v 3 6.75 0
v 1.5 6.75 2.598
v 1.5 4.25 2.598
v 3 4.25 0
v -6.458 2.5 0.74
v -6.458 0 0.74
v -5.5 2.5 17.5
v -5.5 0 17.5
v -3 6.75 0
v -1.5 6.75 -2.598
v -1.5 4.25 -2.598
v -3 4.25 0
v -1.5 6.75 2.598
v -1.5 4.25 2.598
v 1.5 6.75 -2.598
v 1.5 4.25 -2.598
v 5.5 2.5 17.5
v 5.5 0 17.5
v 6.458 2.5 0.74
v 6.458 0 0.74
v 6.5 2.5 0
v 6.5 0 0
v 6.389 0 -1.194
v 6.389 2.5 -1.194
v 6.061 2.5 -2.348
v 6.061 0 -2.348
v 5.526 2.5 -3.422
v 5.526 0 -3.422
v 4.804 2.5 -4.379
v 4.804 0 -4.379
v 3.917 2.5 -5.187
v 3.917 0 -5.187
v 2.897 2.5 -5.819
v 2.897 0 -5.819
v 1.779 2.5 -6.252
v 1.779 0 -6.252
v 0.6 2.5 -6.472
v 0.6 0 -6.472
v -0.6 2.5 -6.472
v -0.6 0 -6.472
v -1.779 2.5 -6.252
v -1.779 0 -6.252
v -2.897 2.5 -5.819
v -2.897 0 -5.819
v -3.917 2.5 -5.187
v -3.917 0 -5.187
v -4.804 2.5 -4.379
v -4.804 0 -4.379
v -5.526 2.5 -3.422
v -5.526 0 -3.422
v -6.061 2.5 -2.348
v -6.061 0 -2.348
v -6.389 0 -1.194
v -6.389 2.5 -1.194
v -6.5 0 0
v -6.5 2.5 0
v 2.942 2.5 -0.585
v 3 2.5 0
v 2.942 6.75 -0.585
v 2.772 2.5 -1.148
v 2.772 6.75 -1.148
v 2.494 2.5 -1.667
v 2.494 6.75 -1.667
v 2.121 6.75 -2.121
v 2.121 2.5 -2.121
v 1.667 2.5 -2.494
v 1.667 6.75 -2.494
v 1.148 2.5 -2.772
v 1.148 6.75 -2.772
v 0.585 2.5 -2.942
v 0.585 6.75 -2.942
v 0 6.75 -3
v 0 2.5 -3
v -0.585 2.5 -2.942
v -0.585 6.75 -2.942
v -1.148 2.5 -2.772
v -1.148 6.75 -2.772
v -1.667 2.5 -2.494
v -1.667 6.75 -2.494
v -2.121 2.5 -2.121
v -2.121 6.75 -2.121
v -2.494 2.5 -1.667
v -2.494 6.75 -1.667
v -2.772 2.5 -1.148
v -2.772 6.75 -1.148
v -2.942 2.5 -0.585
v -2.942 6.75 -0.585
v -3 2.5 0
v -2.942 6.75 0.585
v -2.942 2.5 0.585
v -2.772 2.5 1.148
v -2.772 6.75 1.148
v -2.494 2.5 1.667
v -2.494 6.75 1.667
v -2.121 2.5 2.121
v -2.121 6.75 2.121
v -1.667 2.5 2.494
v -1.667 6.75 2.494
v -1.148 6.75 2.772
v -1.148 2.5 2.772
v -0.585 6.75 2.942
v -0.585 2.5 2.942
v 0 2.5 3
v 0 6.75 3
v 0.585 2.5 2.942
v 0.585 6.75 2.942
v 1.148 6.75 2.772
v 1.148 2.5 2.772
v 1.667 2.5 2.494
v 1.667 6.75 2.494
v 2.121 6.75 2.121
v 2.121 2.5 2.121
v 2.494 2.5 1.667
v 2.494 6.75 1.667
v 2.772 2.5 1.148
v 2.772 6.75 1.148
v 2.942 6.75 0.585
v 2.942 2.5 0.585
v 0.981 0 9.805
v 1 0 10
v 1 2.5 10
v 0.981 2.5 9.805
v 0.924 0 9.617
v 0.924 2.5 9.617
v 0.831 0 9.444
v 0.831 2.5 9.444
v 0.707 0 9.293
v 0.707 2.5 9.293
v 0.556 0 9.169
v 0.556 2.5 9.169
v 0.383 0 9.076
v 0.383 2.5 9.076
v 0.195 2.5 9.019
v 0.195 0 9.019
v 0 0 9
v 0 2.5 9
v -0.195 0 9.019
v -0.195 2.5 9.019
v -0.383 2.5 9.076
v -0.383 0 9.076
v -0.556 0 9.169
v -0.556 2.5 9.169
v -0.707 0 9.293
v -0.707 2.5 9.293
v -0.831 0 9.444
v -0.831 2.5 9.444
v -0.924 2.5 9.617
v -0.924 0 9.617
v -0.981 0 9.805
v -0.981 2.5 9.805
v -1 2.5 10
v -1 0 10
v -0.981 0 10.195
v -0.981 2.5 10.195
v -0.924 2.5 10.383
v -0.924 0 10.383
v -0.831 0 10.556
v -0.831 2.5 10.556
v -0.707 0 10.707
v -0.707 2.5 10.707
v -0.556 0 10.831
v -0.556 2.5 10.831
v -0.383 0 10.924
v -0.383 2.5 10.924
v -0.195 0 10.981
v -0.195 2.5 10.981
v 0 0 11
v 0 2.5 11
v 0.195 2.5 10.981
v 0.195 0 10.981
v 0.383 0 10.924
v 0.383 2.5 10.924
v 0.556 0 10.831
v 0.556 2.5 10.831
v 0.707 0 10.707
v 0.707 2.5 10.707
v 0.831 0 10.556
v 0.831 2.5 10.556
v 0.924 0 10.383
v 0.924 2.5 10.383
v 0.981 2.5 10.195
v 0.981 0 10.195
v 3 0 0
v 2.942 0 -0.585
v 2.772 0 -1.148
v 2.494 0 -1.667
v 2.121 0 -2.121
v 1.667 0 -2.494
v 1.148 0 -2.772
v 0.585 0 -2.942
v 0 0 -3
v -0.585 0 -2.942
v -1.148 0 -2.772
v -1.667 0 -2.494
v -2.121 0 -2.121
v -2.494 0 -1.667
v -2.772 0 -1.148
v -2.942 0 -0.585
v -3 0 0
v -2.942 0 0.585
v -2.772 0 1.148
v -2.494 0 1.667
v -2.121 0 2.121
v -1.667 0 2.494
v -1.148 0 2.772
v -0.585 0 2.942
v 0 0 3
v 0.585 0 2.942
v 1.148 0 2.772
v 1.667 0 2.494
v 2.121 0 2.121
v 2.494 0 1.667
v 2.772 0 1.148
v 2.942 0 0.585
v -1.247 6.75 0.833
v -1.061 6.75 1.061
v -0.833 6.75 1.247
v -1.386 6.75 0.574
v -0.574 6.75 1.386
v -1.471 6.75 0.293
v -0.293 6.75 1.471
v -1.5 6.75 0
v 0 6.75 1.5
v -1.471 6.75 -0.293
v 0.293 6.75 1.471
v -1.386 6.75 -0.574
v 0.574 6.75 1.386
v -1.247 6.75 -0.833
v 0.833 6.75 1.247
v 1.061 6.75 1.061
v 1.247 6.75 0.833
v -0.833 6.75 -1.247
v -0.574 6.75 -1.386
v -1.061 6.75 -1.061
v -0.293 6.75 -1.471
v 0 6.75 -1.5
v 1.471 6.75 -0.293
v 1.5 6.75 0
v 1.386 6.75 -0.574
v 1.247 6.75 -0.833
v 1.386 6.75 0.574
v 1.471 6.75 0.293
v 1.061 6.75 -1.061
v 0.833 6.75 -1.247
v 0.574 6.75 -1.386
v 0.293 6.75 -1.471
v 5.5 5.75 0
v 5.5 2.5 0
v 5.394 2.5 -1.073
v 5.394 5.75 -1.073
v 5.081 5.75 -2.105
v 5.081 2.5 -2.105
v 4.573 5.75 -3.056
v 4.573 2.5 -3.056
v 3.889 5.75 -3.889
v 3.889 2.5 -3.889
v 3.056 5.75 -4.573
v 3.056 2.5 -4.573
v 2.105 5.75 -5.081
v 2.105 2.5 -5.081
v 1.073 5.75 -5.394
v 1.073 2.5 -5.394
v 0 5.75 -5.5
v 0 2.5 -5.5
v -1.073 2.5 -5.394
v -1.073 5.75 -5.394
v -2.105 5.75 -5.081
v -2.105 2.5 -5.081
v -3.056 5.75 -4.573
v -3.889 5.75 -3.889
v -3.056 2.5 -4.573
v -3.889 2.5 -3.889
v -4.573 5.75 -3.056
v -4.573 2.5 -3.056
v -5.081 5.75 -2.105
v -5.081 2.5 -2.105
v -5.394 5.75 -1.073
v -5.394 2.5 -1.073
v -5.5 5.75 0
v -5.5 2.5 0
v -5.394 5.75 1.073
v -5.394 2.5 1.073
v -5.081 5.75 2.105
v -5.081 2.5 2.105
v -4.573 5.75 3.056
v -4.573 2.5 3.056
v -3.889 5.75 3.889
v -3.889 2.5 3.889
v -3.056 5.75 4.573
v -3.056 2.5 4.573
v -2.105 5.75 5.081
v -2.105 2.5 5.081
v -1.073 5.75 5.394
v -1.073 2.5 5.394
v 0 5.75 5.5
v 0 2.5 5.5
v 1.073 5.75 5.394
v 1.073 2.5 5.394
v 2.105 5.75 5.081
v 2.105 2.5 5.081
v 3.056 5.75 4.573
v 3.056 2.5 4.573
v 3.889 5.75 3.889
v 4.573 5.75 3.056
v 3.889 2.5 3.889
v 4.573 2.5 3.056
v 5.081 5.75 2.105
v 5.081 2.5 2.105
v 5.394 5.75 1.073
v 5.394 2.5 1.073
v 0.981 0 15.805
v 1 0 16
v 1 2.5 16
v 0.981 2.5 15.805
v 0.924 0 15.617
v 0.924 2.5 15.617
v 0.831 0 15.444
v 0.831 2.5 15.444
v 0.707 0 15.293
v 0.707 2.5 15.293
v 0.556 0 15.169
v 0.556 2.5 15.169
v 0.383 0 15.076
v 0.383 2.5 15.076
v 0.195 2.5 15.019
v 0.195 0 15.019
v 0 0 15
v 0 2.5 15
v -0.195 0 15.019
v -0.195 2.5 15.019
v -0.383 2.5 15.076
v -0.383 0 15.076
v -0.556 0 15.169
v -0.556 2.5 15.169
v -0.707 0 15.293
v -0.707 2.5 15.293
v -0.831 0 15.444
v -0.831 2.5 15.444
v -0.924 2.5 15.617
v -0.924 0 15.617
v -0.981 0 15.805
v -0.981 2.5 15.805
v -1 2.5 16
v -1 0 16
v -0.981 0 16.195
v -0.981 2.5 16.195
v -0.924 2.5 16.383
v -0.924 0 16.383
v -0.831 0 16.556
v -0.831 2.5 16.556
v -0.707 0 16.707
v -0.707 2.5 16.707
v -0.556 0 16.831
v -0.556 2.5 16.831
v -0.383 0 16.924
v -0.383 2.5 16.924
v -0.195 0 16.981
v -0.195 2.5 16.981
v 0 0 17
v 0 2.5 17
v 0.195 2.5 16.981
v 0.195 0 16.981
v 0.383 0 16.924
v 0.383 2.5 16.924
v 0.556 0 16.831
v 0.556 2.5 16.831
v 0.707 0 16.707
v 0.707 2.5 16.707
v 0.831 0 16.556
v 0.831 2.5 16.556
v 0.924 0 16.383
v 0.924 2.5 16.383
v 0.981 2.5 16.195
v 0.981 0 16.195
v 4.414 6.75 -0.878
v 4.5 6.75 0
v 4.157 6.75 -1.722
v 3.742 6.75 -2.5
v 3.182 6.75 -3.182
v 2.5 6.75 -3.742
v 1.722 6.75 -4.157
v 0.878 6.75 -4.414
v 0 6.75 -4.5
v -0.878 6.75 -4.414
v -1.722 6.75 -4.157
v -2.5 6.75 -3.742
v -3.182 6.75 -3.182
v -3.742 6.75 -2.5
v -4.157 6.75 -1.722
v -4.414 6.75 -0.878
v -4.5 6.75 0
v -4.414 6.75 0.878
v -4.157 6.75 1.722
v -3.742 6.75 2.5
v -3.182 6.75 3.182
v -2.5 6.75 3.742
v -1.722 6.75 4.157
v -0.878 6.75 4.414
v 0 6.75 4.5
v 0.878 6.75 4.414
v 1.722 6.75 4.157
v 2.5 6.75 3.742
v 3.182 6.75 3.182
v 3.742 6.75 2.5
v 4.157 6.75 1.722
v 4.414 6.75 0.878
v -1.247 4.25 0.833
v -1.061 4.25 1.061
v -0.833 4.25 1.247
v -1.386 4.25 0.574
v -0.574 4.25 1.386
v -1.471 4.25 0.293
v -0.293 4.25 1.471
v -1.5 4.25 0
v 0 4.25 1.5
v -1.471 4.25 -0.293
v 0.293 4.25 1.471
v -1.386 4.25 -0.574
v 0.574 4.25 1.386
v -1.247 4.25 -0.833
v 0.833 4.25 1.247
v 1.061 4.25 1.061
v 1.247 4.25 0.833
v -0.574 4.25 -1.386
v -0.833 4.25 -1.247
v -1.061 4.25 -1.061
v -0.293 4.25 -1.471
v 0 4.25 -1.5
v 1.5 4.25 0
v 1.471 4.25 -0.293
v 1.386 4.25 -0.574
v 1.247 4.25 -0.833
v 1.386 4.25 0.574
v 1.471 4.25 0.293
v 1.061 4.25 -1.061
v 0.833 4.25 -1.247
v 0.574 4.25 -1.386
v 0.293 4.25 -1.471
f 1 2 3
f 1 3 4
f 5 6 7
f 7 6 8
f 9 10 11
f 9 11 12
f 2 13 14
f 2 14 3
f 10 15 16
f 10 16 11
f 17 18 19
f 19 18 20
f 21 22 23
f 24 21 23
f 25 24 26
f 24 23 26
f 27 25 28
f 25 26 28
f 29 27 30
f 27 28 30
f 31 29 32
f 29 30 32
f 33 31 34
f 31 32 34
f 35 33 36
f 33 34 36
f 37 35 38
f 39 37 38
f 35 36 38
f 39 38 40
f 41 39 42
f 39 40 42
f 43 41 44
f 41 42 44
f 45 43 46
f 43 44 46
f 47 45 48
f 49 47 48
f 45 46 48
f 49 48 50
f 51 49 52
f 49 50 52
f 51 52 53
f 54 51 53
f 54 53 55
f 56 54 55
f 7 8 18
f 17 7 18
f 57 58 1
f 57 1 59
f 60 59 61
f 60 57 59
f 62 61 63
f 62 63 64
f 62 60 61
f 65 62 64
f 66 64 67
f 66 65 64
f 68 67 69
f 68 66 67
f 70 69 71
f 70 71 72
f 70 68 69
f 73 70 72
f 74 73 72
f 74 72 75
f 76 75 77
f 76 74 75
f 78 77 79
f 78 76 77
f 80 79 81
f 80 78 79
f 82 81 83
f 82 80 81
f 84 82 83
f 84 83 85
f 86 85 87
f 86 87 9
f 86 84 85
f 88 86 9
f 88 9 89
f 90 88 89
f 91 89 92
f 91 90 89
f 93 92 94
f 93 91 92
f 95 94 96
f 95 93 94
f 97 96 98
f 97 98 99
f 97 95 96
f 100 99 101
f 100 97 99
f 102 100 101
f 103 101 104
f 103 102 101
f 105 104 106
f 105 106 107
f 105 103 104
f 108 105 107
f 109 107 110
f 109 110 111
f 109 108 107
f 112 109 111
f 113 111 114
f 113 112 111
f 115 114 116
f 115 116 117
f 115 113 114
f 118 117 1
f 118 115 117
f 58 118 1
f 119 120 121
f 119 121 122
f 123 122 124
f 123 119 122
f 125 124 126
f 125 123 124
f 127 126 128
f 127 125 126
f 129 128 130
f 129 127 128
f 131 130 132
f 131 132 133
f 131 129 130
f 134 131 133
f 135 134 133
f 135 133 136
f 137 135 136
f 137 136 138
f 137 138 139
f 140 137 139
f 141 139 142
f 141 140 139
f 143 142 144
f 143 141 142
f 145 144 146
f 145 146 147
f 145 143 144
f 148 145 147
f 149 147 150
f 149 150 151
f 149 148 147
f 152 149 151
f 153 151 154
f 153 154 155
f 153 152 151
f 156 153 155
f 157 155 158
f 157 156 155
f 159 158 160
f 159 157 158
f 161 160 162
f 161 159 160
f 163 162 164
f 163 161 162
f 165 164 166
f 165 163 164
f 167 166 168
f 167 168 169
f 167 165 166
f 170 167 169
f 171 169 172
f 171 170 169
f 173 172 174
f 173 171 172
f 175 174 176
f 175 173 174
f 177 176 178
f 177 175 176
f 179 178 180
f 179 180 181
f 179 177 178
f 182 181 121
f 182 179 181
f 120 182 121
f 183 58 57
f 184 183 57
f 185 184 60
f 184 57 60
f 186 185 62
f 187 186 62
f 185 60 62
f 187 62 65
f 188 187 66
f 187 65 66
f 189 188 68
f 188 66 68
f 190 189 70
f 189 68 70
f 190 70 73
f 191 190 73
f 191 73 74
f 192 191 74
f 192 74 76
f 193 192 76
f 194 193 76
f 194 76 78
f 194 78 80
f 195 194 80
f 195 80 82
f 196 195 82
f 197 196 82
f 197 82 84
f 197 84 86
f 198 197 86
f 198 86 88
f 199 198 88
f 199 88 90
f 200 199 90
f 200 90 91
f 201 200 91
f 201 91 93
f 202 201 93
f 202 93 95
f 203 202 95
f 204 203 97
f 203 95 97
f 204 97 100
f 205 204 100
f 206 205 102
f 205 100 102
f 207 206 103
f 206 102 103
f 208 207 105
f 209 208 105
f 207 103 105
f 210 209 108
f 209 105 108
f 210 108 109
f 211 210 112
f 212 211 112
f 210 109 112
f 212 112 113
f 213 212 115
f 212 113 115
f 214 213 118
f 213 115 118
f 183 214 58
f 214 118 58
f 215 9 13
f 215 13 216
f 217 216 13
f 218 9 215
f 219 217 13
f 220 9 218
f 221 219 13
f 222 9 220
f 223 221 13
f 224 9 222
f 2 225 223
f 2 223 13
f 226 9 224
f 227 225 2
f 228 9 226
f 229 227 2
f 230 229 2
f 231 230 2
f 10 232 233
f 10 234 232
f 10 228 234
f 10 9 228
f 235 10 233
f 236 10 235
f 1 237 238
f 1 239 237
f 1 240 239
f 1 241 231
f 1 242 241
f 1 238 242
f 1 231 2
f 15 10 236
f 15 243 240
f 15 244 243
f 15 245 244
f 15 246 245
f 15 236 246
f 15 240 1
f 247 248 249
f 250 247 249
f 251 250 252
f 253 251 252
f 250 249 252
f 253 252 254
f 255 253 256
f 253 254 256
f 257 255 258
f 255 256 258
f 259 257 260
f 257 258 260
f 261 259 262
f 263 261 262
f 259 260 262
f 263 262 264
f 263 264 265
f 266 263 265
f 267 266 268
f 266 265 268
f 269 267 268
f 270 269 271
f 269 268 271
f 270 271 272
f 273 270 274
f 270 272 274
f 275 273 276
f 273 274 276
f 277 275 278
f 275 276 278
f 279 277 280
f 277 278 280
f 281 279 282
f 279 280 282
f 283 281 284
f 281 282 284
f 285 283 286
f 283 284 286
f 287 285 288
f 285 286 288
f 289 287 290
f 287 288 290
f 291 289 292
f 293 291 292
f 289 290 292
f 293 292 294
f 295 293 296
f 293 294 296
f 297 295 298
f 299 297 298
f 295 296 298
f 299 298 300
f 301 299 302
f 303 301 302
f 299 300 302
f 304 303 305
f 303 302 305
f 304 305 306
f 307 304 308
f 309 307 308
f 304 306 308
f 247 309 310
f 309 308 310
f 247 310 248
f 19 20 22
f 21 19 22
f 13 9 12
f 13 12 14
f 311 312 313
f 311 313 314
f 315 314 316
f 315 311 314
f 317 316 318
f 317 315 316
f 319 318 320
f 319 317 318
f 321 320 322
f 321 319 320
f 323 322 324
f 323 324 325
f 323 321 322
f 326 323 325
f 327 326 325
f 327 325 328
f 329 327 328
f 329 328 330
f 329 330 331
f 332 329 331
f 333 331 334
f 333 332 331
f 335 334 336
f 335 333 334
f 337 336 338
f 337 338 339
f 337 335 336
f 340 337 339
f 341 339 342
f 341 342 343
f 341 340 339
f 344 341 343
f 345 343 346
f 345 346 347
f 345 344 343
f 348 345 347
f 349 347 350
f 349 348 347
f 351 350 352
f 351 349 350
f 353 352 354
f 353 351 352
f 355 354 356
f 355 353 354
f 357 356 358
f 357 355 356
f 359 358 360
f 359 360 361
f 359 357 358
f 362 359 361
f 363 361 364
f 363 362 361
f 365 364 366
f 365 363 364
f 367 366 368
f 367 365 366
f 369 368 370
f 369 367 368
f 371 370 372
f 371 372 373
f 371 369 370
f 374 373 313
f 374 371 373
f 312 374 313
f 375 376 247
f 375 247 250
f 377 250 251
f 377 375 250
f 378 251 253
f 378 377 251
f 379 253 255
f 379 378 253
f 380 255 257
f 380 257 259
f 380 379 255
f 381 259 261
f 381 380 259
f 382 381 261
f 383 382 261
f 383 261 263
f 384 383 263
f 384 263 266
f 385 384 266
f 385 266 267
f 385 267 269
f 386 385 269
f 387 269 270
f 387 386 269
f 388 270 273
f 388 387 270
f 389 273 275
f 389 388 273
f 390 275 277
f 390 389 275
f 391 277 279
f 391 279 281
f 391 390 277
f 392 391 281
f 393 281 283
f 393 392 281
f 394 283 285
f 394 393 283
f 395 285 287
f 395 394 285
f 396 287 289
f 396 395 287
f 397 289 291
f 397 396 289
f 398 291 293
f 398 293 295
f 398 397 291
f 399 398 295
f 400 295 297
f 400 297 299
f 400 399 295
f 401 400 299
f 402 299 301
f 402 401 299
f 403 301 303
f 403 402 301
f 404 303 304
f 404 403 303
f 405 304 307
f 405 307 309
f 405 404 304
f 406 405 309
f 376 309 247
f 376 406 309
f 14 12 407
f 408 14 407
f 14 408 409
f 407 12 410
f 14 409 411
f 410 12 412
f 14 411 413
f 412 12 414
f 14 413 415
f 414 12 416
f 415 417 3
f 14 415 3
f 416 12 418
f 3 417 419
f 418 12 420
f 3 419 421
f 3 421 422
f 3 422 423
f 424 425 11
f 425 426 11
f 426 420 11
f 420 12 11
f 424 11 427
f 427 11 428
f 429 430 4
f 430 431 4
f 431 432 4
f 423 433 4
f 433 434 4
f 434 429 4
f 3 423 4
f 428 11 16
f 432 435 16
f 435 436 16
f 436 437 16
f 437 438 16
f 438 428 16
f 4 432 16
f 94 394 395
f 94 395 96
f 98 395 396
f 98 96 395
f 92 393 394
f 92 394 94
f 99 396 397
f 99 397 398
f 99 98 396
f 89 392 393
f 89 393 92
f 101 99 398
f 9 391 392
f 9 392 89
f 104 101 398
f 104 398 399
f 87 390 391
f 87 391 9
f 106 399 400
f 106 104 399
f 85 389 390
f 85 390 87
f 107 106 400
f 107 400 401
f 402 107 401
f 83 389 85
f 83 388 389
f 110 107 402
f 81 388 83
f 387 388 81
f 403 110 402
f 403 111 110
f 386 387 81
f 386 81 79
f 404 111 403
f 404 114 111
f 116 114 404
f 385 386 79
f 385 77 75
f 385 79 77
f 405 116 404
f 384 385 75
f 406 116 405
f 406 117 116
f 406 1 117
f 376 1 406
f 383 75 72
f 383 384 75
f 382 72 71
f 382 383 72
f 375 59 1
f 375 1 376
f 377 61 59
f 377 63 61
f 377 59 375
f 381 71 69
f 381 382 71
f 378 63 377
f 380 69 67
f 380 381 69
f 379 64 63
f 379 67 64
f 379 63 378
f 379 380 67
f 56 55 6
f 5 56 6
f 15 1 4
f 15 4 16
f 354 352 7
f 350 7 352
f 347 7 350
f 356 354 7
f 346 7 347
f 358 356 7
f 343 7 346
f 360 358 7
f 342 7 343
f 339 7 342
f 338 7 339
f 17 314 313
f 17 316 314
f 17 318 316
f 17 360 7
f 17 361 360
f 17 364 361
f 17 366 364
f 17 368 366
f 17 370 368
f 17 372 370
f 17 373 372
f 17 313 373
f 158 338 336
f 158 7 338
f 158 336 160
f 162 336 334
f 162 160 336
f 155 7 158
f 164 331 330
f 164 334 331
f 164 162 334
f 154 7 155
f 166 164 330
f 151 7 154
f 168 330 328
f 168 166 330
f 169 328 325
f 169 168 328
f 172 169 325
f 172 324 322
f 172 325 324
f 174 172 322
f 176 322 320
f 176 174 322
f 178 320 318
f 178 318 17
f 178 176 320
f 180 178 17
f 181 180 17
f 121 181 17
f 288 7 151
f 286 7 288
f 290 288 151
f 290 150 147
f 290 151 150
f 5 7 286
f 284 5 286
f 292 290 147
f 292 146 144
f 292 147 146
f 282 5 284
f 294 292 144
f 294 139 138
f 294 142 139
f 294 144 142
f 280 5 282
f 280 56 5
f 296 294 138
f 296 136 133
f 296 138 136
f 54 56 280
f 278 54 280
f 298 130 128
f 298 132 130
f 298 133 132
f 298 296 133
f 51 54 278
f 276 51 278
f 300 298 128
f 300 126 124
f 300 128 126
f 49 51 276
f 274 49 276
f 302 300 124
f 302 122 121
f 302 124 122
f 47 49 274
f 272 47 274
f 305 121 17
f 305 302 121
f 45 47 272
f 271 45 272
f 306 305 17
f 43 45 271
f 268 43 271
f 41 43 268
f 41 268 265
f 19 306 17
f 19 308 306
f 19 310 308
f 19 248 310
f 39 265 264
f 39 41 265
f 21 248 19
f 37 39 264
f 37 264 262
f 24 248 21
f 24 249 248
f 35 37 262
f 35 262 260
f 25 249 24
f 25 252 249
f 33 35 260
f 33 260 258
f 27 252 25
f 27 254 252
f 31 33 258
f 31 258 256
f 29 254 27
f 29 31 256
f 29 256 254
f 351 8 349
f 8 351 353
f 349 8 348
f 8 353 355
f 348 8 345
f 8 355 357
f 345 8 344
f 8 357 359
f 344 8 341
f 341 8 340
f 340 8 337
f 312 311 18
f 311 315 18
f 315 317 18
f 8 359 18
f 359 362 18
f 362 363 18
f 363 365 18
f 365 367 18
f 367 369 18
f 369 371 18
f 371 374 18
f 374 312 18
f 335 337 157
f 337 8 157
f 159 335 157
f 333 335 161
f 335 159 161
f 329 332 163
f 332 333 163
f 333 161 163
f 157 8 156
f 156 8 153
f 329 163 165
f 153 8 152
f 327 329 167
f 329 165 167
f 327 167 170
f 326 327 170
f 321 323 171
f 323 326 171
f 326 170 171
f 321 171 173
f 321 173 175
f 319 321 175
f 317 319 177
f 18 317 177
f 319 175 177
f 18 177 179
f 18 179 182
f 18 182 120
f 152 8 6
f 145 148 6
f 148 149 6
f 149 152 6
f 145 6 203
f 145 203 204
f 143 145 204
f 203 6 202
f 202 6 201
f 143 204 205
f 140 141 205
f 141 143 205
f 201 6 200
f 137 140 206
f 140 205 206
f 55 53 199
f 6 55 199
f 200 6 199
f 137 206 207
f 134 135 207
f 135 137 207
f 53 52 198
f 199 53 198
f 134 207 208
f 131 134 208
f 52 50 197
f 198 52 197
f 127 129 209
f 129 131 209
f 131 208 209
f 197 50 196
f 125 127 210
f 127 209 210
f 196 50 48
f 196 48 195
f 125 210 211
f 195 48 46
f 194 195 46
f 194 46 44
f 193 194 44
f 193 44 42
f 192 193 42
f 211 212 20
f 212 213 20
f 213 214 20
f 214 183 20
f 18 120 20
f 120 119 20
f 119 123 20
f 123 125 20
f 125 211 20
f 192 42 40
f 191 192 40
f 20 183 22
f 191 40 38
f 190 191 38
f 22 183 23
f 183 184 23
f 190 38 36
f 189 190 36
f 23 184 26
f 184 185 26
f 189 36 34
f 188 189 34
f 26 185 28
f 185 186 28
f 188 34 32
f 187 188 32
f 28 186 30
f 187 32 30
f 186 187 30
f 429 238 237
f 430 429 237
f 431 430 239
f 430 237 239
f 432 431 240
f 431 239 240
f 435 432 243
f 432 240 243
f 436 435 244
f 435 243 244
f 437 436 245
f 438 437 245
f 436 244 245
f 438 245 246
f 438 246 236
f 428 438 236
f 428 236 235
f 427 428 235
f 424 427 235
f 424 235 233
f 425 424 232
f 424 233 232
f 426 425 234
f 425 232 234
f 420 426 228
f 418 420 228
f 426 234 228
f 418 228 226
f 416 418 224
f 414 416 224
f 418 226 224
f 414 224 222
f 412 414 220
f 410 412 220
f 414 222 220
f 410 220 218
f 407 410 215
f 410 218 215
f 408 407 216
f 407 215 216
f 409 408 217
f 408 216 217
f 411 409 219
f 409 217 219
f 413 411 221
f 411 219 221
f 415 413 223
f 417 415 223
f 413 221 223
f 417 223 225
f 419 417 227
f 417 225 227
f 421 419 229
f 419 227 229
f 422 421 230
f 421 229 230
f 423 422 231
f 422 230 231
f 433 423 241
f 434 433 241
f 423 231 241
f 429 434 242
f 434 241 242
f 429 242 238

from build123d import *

# Parameters (mm, degrees)
SKETCH1_R           = 1
BOSS_EXTRUDE1_DEPTH = 2.5
SKETCH2_R           = 5.5
SKETCH2_R_2         = 3
BOSS_EXTRUDE3_DEPTH = 4.25
CUT_EXTRUDE1_REACH  = 4.5
SKETCH4_R           = 3
CHAMFER1_SIZE       = 1
SKETCH5_R           = 1.5
BOSS_EXTRUDE4_DEPTH = 2.5


with BuildPart() as part:
    # Sketch1 → Boss-Extrude1 (new body)
    with BuildSketch(Plane(origin=(0, 0, 0), x_dir=(1, 0, 0), z_dir=(0, 1, 0))):
        with BuildLine():
            ThreePointArc((6.5, 0), (0, 6.5), (-6.5, 0))
            Line((-6.5, 0), (-6.457689178, -0.740439382))
            Line((-6.457689178, -0.740439382), (-5.5, -17.5))
            Line((-5.5, -17.5), (5.5, -17.5))
            Line((5.5, -17.5), (6.457689178, -0.740439382))
            Line((6.457689178, -0.740439382), (6.5, 0))
        make_face()
        with Locations((0, -16)):
            Circle(SKETCH1_R, mode=Mode.SUBTRACT)
        with Locations((0, -10)):
            Circle(SKETCH1_R, mode=Mode.SUBTRACT)
    extrude(amount=BOSS_EXTRUDE1_DEPTH)

    # Sketch2 → Boss-Extrude3 (add)
    with BuildSketch(Plane(origin=(0, 2.5, 0), x_dir=(1, 0, 0), z_dir=(0, 1, 0))):
        Circle(SKETCH2_R)
        Circle(SKETCH2_R_2, mode=Mode.SUBTRACT)
    extrude(amount=BOSS_EXTRUDE3_DEPTH)

    # Sketch4 → Cut-Extrude1 (cut, up to next)
    with BuildSketch(Plane(origin=(0, 2.5, 0), x_dir=(1, 0, 0), z_dir=(0, 1, 0)), mode=Mode.PRIVATE) as cut_extrude1_sk1:
        Circle(SKETCH4_R)
    cut_extrude1_tool1 = extrude(cut_extrude1_sk1.sketch, amount=-CUT_EXTRUDE1_REACH, mode=Mode.PRIVATE) & part.part
    add(cut_extrude1_tool1.solids().sort_by_distance((0, 2.5, 0))[0], mode=Mode.SUBTRACT)

    # Chamfer1
    chamfer1_edges = [part.edges().sort_by_distance(p)[0] for p in [
        (-5.5, 6.75, 0),
    ]]
    chamfer(chamfer1_edges, length=CHAMFER1_SIZE)


with BuildPart() as body_2:
    # Sketch5 → Boss-Extrude4 (new body)
    with BuildSketch(Plane(origin=(0, 6.75, 0), x_dir=(1, 0, 0), z_dir=(0, 1, 0))):
        Polygon((3, 0), (1.5, 2.598076211), (-1.5, 2.598076211), (-3, 0), (-1.5, -2.598076211), (1.5, -2.598076211), align=None)
        Circle(SKETCH5_R, mode=Mode.SUBTRACT)
    extrude(amount=-BOSS_EXTRUDE4_DEPTH)


solid = Compound([part.part, body_2.part])
